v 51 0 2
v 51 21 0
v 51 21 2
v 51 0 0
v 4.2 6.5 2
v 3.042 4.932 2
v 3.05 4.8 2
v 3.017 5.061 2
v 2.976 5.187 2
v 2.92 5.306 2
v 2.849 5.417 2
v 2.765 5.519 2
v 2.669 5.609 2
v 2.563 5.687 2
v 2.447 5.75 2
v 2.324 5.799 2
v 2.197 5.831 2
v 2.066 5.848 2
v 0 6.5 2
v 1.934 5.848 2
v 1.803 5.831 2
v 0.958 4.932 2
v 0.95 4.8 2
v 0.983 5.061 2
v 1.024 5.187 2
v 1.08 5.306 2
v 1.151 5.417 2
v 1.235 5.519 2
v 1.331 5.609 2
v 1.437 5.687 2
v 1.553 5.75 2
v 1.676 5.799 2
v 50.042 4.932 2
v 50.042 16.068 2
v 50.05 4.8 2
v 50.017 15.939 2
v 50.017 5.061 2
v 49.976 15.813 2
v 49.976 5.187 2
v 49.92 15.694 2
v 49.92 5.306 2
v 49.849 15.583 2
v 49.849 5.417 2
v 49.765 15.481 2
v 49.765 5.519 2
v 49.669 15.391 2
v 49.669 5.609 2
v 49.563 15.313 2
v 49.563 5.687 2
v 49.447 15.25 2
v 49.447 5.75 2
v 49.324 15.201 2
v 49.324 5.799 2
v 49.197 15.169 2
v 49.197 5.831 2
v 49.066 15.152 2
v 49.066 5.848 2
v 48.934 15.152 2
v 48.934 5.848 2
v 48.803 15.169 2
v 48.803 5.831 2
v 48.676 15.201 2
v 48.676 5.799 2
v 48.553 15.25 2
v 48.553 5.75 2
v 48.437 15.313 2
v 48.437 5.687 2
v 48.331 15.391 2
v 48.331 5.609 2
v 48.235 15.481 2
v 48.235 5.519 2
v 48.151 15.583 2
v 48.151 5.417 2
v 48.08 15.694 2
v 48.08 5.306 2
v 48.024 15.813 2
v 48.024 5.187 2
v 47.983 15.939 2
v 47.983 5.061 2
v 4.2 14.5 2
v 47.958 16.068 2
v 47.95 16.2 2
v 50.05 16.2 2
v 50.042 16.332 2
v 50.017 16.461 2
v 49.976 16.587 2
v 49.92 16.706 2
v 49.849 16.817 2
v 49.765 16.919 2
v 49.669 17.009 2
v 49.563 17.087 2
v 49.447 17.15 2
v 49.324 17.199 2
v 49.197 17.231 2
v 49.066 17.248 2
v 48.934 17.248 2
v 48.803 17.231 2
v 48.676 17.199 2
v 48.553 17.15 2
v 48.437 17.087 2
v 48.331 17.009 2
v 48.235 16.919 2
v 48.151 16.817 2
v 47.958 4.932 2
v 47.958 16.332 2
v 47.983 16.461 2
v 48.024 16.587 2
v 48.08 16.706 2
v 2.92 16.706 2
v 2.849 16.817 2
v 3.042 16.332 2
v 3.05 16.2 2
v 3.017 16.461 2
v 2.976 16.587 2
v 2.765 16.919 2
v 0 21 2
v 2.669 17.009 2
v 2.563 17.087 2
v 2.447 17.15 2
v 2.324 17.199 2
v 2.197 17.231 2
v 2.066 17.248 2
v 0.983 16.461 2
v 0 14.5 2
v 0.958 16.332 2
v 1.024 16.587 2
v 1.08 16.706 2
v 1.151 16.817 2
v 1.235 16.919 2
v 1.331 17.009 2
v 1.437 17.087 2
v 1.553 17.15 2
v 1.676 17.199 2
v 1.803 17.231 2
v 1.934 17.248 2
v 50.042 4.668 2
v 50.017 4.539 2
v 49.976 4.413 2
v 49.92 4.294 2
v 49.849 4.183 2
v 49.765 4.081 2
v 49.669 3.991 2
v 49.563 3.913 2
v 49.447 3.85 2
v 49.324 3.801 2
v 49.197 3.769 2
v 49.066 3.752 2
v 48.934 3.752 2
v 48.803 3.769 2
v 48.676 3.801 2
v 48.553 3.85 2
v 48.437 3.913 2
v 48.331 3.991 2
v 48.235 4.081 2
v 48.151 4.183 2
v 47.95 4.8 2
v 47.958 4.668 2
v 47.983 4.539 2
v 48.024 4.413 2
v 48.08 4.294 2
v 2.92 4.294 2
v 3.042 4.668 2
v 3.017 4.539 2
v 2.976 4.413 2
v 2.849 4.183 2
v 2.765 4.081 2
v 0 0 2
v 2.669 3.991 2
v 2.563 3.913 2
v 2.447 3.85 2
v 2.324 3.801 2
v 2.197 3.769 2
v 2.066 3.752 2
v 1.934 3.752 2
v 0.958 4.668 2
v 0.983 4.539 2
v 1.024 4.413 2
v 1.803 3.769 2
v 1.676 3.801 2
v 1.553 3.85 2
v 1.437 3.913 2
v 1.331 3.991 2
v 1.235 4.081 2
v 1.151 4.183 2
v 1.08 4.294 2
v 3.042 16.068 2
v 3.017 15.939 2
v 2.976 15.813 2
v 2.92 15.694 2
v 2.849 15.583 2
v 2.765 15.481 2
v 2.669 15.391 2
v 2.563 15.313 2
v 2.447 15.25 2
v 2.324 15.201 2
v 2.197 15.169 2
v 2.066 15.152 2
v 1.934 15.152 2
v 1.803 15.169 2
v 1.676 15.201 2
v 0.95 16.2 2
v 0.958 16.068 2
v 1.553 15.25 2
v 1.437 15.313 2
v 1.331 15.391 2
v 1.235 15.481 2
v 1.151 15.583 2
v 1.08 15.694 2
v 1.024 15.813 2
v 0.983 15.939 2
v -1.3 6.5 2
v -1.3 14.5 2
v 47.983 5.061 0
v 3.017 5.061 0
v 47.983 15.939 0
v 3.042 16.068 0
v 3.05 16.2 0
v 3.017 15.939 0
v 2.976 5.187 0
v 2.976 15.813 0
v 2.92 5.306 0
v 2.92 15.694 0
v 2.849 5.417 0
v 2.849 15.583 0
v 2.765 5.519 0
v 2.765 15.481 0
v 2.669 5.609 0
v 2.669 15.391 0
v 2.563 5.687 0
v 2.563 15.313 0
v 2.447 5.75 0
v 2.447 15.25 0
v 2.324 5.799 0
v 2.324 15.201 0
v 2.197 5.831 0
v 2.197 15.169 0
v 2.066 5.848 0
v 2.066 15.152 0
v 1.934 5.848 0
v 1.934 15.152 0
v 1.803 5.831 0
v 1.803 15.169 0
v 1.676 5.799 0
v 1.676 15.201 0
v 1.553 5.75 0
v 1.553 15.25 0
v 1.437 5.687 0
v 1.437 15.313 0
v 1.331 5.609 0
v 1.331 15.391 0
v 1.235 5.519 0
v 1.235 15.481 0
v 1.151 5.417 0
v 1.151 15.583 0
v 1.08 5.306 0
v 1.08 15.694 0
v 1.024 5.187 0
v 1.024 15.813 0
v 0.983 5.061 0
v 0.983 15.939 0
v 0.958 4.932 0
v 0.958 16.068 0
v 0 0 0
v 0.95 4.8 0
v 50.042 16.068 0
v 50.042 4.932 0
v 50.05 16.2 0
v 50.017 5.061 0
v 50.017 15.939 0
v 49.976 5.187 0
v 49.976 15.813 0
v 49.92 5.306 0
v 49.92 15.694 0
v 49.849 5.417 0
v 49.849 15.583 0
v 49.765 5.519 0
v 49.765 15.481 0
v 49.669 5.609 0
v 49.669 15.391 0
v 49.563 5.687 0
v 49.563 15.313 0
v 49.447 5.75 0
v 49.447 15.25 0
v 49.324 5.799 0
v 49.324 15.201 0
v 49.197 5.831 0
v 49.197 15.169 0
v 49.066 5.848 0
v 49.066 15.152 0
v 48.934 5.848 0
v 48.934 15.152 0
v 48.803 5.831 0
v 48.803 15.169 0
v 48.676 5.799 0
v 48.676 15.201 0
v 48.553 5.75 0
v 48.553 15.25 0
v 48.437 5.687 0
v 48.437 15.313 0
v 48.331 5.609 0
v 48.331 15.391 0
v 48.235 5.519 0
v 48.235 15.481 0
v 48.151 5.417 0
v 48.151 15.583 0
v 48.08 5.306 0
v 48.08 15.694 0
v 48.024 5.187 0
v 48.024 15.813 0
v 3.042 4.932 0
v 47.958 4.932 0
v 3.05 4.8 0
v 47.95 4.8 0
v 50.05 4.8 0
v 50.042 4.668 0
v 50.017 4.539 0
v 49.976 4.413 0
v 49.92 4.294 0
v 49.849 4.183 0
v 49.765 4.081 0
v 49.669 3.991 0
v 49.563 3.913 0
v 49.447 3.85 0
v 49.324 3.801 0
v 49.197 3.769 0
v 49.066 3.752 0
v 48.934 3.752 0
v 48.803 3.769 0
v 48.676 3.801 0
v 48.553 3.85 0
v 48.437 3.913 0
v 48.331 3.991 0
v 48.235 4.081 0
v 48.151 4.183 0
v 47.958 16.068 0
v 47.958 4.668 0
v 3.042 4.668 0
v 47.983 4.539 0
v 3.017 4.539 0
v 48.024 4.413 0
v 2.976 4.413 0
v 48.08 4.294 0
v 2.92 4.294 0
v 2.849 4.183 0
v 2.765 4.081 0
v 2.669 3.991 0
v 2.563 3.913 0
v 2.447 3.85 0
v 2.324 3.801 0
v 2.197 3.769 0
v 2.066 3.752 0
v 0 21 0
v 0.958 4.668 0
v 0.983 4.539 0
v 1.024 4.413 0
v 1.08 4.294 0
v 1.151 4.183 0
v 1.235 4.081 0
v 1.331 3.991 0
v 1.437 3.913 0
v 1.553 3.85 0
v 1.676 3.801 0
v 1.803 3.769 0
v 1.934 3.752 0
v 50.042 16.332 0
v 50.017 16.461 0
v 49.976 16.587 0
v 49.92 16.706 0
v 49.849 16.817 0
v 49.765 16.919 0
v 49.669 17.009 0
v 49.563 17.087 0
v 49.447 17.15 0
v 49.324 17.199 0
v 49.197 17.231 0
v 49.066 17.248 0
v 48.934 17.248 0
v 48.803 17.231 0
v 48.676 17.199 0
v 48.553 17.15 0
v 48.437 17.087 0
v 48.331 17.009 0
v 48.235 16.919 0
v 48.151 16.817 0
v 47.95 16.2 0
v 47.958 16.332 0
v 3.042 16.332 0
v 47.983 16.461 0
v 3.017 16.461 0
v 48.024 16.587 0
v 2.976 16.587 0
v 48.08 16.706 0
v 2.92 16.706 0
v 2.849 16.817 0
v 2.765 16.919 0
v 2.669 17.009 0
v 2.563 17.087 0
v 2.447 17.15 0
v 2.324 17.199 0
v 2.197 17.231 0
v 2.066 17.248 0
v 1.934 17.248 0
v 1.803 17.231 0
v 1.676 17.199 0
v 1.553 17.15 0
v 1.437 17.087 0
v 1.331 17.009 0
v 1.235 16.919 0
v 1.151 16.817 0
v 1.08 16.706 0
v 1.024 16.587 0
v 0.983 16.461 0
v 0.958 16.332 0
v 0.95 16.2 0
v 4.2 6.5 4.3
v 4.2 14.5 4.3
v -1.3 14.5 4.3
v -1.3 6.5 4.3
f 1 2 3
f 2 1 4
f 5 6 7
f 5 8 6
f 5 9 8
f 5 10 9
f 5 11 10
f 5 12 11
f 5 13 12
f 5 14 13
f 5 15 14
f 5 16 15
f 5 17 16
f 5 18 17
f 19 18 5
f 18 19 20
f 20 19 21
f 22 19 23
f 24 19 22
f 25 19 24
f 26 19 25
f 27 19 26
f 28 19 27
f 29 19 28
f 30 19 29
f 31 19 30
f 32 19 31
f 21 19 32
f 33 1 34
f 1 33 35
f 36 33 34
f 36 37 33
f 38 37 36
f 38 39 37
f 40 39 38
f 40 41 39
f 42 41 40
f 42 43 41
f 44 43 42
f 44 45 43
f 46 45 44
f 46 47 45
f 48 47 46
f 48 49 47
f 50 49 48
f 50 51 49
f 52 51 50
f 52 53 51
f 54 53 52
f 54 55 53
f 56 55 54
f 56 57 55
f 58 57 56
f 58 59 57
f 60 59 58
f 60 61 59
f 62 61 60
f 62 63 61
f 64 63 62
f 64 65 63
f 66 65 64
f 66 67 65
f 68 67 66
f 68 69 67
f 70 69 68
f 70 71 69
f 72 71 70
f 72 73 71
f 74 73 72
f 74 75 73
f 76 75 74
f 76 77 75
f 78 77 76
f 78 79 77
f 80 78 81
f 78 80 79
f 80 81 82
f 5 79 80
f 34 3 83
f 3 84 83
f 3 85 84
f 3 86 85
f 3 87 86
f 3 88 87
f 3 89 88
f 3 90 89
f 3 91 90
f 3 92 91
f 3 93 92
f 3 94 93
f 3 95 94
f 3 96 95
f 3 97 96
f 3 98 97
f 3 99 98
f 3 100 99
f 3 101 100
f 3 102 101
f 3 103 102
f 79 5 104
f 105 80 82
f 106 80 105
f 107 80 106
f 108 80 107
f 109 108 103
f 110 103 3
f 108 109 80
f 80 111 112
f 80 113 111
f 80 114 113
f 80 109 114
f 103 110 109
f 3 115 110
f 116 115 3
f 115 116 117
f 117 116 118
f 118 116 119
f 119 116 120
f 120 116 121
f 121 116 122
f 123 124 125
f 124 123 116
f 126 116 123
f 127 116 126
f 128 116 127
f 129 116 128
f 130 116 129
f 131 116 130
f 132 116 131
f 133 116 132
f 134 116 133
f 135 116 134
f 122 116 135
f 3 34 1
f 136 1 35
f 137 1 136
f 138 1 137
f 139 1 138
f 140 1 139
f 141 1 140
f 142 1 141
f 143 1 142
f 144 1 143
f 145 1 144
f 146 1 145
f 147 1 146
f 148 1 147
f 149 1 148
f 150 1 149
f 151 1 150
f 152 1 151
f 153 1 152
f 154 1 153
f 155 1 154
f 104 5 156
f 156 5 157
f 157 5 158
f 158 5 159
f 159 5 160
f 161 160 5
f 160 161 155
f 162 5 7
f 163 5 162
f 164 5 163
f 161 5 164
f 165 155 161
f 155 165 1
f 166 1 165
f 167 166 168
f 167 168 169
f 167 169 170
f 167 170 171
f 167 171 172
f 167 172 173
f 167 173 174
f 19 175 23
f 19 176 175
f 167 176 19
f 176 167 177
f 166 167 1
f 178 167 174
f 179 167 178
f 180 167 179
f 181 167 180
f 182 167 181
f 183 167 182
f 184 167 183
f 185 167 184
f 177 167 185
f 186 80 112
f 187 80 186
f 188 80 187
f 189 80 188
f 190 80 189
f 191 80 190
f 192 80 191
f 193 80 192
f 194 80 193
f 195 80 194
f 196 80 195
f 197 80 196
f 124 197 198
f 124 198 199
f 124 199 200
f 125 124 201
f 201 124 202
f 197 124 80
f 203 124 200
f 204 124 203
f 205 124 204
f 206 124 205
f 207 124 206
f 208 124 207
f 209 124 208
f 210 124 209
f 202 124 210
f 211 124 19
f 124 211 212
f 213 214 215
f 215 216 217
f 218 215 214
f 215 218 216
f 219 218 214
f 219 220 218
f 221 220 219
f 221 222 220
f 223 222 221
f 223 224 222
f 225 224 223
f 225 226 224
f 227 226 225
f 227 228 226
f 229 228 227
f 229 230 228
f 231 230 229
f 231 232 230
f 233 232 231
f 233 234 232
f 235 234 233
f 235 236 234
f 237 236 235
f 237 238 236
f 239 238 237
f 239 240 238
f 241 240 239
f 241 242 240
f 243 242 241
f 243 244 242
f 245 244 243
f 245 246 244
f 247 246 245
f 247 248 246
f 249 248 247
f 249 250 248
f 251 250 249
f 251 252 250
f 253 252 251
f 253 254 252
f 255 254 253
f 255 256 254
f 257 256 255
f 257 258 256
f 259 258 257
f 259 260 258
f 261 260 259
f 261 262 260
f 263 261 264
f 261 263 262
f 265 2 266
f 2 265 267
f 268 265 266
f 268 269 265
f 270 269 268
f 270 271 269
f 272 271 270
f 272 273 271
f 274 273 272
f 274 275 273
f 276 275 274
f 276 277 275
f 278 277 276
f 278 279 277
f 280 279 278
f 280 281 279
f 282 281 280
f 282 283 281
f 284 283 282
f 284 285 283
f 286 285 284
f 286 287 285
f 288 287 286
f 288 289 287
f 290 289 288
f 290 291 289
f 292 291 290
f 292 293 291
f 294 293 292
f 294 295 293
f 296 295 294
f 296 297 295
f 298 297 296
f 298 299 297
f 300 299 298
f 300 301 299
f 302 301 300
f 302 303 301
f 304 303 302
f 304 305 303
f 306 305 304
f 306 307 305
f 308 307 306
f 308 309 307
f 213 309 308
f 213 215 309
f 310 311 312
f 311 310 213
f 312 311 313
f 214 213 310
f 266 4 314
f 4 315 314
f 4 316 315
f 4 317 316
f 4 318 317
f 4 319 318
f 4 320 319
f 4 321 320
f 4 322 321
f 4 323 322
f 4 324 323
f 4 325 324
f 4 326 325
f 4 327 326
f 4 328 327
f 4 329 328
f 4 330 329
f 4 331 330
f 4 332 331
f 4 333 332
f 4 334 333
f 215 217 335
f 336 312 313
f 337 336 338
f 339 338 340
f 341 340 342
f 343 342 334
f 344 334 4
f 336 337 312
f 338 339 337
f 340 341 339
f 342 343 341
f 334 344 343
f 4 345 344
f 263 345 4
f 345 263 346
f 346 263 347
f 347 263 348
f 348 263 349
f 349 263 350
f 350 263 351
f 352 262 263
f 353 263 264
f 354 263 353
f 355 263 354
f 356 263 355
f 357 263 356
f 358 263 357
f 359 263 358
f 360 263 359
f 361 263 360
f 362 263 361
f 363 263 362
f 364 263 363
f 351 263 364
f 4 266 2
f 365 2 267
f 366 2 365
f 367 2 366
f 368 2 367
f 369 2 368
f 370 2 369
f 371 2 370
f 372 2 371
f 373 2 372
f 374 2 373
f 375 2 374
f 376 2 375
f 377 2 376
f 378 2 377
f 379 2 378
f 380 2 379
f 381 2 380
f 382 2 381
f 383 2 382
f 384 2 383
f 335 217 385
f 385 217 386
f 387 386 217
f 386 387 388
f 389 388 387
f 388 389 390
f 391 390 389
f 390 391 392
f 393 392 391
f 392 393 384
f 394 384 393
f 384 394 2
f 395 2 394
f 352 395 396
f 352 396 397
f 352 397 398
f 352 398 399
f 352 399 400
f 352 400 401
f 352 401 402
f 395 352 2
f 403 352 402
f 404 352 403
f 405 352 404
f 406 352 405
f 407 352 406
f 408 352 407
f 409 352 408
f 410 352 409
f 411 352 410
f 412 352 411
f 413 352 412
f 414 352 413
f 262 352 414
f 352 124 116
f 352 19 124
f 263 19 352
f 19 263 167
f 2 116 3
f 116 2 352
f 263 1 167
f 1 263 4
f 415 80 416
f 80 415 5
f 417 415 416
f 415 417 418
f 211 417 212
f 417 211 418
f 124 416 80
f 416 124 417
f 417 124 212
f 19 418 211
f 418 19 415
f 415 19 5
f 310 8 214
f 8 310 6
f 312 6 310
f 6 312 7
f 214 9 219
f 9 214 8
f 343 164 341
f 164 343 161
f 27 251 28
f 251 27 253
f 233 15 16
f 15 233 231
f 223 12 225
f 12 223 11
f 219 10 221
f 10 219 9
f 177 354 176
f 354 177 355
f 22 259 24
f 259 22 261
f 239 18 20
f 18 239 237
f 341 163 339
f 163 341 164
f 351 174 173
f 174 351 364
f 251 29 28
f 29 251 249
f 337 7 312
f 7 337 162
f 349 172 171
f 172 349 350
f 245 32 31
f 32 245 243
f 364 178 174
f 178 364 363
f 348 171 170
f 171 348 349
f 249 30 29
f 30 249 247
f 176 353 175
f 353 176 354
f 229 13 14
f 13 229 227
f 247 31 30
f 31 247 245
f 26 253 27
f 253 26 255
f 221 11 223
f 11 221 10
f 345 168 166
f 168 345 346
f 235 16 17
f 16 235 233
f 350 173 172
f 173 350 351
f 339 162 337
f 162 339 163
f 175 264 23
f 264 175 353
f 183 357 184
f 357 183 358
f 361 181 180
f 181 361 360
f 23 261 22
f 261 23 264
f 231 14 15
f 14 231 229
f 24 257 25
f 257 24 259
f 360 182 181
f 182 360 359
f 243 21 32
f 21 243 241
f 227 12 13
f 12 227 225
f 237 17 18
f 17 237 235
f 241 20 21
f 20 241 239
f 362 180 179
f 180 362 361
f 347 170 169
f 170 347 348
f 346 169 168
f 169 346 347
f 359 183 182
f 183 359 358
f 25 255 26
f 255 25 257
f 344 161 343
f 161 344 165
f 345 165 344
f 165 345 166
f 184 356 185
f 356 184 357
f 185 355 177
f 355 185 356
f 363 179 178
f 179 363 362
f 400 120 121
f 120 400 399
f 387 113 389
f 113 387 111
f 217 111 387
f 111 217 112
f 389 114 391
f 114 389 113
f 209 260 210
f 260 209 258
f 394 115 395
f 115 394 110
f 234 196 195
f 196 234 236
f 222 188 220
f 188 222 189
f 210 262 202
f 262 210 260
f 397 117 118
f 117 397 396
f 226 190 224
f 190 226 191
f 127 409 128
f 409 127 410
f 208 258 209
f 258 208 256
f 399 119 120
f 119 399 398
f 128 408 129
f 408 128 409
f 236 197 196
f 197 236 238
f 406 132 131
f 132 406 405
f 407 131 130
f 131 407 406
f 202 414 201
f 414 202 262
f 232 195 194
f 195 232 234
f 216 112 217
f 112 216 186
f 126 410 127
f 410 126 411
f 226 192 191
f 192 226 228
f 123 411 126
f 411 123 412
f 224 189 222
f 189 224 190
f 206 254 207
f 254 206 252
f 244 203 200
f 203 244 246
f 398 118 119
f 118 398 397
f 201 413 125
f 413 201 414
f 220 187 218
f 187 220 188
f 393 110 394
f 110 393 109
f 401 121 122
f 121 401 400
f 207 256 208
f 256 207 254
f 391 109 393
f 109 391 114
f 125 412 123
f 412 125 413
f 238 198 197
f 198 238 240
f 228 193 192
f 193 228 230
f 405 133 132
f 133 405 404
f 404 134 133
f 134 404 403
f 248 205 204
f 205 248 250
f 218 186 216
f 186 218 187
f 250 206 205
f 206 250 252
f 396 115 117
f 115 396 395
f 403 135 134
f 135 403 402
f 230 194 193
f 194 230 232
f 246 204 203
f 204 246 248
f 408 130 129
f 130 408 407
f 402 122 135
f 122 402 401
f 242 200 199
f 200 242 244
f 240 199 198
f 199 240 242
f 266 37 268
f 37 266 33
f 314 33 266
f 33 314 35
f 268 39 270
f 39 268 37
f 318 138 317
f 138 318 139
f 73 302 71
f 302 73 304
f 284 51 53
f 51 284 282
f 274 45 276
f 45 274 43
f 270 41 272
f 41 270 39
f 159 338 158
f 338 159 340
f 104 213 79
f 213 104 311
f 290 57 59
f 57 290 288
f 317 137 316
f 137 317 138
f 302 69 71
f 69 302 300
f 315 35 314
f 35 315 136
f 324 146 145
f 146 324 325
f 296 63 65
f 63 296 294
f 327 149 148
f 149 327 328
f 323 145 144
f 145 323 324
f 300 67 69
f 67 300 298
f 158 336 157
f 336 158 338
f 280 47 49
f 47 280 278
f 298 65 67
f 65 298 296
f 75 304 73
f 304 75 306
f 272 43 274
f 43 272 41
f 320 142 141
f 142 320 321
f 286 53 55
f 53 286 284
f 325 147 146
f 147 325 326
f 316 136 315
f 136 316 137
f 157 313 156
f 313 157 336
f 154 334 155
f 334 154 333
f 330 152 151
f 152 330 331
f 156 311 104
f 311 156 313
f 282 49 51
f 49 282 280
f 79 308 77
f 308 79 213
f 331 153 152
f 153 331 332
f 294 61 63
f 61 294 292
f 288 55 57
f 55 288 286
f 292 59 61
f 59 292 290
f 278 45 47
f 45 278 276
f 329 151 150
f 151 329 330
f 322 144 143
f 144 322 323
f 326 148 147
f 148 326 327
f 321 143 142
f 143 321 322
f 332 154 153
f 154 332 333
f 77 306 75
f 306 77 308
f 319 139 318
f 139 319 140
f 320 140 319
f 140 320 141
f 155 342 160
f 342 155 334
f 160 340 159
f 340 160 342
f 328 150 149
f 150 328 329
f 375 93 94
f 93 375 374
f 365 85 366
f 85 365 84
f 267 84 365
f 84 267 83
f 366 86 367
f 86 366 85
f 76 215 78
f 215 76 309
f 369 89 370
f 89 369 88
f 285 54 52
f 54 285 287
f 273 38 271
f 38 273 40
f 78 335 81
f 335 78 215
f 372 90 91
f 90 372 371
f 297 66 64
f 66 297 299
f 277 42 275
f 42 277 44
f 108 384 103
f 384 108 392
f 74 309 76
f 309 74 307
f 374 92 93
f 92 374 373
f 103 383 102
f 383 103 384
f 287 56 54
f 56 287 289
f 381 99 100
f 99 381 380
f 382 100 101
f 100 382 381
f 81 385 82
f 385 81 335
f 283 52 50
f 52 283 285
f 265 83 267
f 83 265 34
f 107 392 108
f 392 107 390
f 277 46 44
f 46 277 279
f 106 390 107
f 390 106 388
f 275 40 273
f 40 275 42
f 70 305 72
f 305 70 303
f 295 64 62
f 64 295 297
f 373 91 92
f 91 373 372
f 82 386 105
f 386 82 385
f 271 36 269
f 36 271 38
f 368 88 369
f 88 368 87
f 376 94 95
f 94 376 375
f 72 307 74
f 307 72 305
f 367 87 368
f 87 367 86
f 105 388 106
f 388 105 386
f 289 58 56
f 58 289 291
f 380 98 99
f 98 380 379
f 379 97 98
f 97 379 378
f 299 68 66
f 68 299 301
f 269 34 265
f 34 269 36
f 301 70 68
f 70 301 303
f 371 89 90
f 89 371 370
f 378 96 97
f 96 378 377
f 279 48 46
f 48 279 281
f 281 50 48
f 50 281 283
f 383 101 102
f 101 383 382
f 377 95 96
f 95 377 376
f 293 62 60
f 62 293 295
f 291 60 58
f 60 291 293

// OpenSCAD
// file: board_config.scad
rail_position=20;
rail_height=2.5;
rail_width=5;
mainboard_width=60;
mainboard_height=130;
mainboard_thickness=4;
mainboard_spacing=10;
deep_holes_spacing=10;
rails=4;


board_attacher_width=4;
board_attacher_height=55;
board_attacher_length=30;

side_panel_height = board_attacher_height + 2*mainboard_thickness;
side_panel_thickness=2;
side_panel_ticks=2;

front_panel_height = board_attacher_height + 2*mainboard_thickness;
front_panel_thickness=2;
front_panel_ticks=2;
front_panel_width = mainboard_height + 2*side_panel_thickness;
// file: dovetail.scad
module dovetail_shape(width, height, length) {
    translate([-width/2,0,0]) linear_extrude(height = length) {
        polygon([[0, 0], [width, 0], [width - width/3, height], [width/3, height]]);
    }
}

module rail(male=false, width, height, length, default_offset=0.2) {
    // male will reduce the width slightly
    offset = male ? default_offset : 0;
    
    translate([0,0,-height+offset]) rotate([90,0,0]) dovetail_shape(width-2*offset,height-offset,length);
}
// file: pico_config.scad
pico_width = 51;
pico_height=21;
pico_thickness=2;
pico_screw_from_width=2;
pico_screw_from_height=4.8;
margin=0.1;
pico_screw_hole=2.1;
usb_height=8;
usb_protrude=1.3;
usb_width=5.5;
usb_thickness=2.3;

pico_holes=[
    [pico_screw_from_width, pico_screw_from_height],
    [pico_screw_from_width, pico_height-pico_screw_from_height],
    [pico_width-pico_screw_from_width,pico_screw_from_height],
    [pico_width-pico_screw_from_width,pico_height-pico_screw_from_height]
];
// file: generic_board.scad
include <dovetail.scad>;
include <board_config.scad>;
include <common.scad>;


hole_spacing=10;
front_back_holes_depth=10;

module generic_board_attacher_mating() {
    difference() {
        cube([board_attacher_width,board_attacher_length,board_attacher_height]);
        // non attaching holes
        
        for (z=[1:board_attacher_height/(hole_spacing/2)-1]) translate([0,0,hole_spacing/2*z]) union() {
            /*for (i=[1:board_attacher_length/hole_spacing-1]) 
                translate([-margin,hole_spacing*i,0]) rotate([0,90,0]) 
                    cylinder(board_attacher_width+2*margin,d=bigscrew_diameter, $fn=50);*/
            for (i=[1:board_attacher_length/(hole_spacing/2)]) 
                translate([-margin,hole_spacing*i/2-hole_spacing/4,0]) rotate([0,90,0]) 
                    cylinder(board_attacher_width+2*margin,d=bigscrew_attach_hole_diameter, $fn=50);                
        }
        // vertical attaching holes
        for (i=[1:board_attacher_height/(hole_spacing/2)-1]) 
            union() {
                translate([board_attacher_width/2,front_back_holes_depth+margin,hole_spacing*i/2]) rotate([90,00,0]) 
                    cylinder(front_back_holes_depth+2*margin,d=bigscrew_attach_hole_diameter, $fn=50);             
                translate([board_attacher_width/2,board_attacher_length+margin,hole_spacing*i/2]) rotate([90,00,0]) 
                    cylinder(front_back_holes_depth+2*margin,d=bigscrew_attach_hole_diameter, $fn=50);             
            }
                
    }
}

module generic_board_attacher() {
    union() {
        generic_board_attacher_mating();
        translate([board_attacher_width/2,board_attacher_length,0]) rail(true, rail_width, rail_height, board_attacher_length);  
        translate([board_attacher_width/2,board_attacher_length,board_attacher_height]) rotate([0,180,0]) rail(true, rail_width, rail_height, board_attacher_length);  
    }
}

//generic_board_attacher();
// file: pico.scad
include <pico_config.scad>;

module pico_holes_block(diameter, margin, extra_up,thickness) {
    $fn=50;
    for(i=[0:3])
        translate([pico_holes[i][0],pico_holes[i][1],-margin/2]) 
            cylinder(h=thickness+margin+extra_up, d=diameter);
}


module pico() {
    difference() {
        union() {
            color("green") cube([pico_width,pico_height,pico_thickness]);
            color("grey") translate([-usb_protrude,(pico_height-usb_height)/2,pico_thickness]) cube([usb_width, usb_height, usb_thickness]);
        }
        pico_holes_block(pico_screw_hole, margin,1,pico_thickness);
    }
}

pico();
// file: common.scad
inch_to_mm = 25.4;

margin=0.1;
bigscrew_attach_hole_diameter= 2.44;
bigscrew_diameter = 2.54;
bigscrew_head_diameter = 5;
bigscrew_head_height = 2.1;
// main file
include <common.scad>
include <pico.scad>
include <generic_board.scad>

module support_pico(ghost=false) {
    if (ghost) {
        rotate([0,-90,0]) pico();
        
    }
    generic_board_attacher();
}
